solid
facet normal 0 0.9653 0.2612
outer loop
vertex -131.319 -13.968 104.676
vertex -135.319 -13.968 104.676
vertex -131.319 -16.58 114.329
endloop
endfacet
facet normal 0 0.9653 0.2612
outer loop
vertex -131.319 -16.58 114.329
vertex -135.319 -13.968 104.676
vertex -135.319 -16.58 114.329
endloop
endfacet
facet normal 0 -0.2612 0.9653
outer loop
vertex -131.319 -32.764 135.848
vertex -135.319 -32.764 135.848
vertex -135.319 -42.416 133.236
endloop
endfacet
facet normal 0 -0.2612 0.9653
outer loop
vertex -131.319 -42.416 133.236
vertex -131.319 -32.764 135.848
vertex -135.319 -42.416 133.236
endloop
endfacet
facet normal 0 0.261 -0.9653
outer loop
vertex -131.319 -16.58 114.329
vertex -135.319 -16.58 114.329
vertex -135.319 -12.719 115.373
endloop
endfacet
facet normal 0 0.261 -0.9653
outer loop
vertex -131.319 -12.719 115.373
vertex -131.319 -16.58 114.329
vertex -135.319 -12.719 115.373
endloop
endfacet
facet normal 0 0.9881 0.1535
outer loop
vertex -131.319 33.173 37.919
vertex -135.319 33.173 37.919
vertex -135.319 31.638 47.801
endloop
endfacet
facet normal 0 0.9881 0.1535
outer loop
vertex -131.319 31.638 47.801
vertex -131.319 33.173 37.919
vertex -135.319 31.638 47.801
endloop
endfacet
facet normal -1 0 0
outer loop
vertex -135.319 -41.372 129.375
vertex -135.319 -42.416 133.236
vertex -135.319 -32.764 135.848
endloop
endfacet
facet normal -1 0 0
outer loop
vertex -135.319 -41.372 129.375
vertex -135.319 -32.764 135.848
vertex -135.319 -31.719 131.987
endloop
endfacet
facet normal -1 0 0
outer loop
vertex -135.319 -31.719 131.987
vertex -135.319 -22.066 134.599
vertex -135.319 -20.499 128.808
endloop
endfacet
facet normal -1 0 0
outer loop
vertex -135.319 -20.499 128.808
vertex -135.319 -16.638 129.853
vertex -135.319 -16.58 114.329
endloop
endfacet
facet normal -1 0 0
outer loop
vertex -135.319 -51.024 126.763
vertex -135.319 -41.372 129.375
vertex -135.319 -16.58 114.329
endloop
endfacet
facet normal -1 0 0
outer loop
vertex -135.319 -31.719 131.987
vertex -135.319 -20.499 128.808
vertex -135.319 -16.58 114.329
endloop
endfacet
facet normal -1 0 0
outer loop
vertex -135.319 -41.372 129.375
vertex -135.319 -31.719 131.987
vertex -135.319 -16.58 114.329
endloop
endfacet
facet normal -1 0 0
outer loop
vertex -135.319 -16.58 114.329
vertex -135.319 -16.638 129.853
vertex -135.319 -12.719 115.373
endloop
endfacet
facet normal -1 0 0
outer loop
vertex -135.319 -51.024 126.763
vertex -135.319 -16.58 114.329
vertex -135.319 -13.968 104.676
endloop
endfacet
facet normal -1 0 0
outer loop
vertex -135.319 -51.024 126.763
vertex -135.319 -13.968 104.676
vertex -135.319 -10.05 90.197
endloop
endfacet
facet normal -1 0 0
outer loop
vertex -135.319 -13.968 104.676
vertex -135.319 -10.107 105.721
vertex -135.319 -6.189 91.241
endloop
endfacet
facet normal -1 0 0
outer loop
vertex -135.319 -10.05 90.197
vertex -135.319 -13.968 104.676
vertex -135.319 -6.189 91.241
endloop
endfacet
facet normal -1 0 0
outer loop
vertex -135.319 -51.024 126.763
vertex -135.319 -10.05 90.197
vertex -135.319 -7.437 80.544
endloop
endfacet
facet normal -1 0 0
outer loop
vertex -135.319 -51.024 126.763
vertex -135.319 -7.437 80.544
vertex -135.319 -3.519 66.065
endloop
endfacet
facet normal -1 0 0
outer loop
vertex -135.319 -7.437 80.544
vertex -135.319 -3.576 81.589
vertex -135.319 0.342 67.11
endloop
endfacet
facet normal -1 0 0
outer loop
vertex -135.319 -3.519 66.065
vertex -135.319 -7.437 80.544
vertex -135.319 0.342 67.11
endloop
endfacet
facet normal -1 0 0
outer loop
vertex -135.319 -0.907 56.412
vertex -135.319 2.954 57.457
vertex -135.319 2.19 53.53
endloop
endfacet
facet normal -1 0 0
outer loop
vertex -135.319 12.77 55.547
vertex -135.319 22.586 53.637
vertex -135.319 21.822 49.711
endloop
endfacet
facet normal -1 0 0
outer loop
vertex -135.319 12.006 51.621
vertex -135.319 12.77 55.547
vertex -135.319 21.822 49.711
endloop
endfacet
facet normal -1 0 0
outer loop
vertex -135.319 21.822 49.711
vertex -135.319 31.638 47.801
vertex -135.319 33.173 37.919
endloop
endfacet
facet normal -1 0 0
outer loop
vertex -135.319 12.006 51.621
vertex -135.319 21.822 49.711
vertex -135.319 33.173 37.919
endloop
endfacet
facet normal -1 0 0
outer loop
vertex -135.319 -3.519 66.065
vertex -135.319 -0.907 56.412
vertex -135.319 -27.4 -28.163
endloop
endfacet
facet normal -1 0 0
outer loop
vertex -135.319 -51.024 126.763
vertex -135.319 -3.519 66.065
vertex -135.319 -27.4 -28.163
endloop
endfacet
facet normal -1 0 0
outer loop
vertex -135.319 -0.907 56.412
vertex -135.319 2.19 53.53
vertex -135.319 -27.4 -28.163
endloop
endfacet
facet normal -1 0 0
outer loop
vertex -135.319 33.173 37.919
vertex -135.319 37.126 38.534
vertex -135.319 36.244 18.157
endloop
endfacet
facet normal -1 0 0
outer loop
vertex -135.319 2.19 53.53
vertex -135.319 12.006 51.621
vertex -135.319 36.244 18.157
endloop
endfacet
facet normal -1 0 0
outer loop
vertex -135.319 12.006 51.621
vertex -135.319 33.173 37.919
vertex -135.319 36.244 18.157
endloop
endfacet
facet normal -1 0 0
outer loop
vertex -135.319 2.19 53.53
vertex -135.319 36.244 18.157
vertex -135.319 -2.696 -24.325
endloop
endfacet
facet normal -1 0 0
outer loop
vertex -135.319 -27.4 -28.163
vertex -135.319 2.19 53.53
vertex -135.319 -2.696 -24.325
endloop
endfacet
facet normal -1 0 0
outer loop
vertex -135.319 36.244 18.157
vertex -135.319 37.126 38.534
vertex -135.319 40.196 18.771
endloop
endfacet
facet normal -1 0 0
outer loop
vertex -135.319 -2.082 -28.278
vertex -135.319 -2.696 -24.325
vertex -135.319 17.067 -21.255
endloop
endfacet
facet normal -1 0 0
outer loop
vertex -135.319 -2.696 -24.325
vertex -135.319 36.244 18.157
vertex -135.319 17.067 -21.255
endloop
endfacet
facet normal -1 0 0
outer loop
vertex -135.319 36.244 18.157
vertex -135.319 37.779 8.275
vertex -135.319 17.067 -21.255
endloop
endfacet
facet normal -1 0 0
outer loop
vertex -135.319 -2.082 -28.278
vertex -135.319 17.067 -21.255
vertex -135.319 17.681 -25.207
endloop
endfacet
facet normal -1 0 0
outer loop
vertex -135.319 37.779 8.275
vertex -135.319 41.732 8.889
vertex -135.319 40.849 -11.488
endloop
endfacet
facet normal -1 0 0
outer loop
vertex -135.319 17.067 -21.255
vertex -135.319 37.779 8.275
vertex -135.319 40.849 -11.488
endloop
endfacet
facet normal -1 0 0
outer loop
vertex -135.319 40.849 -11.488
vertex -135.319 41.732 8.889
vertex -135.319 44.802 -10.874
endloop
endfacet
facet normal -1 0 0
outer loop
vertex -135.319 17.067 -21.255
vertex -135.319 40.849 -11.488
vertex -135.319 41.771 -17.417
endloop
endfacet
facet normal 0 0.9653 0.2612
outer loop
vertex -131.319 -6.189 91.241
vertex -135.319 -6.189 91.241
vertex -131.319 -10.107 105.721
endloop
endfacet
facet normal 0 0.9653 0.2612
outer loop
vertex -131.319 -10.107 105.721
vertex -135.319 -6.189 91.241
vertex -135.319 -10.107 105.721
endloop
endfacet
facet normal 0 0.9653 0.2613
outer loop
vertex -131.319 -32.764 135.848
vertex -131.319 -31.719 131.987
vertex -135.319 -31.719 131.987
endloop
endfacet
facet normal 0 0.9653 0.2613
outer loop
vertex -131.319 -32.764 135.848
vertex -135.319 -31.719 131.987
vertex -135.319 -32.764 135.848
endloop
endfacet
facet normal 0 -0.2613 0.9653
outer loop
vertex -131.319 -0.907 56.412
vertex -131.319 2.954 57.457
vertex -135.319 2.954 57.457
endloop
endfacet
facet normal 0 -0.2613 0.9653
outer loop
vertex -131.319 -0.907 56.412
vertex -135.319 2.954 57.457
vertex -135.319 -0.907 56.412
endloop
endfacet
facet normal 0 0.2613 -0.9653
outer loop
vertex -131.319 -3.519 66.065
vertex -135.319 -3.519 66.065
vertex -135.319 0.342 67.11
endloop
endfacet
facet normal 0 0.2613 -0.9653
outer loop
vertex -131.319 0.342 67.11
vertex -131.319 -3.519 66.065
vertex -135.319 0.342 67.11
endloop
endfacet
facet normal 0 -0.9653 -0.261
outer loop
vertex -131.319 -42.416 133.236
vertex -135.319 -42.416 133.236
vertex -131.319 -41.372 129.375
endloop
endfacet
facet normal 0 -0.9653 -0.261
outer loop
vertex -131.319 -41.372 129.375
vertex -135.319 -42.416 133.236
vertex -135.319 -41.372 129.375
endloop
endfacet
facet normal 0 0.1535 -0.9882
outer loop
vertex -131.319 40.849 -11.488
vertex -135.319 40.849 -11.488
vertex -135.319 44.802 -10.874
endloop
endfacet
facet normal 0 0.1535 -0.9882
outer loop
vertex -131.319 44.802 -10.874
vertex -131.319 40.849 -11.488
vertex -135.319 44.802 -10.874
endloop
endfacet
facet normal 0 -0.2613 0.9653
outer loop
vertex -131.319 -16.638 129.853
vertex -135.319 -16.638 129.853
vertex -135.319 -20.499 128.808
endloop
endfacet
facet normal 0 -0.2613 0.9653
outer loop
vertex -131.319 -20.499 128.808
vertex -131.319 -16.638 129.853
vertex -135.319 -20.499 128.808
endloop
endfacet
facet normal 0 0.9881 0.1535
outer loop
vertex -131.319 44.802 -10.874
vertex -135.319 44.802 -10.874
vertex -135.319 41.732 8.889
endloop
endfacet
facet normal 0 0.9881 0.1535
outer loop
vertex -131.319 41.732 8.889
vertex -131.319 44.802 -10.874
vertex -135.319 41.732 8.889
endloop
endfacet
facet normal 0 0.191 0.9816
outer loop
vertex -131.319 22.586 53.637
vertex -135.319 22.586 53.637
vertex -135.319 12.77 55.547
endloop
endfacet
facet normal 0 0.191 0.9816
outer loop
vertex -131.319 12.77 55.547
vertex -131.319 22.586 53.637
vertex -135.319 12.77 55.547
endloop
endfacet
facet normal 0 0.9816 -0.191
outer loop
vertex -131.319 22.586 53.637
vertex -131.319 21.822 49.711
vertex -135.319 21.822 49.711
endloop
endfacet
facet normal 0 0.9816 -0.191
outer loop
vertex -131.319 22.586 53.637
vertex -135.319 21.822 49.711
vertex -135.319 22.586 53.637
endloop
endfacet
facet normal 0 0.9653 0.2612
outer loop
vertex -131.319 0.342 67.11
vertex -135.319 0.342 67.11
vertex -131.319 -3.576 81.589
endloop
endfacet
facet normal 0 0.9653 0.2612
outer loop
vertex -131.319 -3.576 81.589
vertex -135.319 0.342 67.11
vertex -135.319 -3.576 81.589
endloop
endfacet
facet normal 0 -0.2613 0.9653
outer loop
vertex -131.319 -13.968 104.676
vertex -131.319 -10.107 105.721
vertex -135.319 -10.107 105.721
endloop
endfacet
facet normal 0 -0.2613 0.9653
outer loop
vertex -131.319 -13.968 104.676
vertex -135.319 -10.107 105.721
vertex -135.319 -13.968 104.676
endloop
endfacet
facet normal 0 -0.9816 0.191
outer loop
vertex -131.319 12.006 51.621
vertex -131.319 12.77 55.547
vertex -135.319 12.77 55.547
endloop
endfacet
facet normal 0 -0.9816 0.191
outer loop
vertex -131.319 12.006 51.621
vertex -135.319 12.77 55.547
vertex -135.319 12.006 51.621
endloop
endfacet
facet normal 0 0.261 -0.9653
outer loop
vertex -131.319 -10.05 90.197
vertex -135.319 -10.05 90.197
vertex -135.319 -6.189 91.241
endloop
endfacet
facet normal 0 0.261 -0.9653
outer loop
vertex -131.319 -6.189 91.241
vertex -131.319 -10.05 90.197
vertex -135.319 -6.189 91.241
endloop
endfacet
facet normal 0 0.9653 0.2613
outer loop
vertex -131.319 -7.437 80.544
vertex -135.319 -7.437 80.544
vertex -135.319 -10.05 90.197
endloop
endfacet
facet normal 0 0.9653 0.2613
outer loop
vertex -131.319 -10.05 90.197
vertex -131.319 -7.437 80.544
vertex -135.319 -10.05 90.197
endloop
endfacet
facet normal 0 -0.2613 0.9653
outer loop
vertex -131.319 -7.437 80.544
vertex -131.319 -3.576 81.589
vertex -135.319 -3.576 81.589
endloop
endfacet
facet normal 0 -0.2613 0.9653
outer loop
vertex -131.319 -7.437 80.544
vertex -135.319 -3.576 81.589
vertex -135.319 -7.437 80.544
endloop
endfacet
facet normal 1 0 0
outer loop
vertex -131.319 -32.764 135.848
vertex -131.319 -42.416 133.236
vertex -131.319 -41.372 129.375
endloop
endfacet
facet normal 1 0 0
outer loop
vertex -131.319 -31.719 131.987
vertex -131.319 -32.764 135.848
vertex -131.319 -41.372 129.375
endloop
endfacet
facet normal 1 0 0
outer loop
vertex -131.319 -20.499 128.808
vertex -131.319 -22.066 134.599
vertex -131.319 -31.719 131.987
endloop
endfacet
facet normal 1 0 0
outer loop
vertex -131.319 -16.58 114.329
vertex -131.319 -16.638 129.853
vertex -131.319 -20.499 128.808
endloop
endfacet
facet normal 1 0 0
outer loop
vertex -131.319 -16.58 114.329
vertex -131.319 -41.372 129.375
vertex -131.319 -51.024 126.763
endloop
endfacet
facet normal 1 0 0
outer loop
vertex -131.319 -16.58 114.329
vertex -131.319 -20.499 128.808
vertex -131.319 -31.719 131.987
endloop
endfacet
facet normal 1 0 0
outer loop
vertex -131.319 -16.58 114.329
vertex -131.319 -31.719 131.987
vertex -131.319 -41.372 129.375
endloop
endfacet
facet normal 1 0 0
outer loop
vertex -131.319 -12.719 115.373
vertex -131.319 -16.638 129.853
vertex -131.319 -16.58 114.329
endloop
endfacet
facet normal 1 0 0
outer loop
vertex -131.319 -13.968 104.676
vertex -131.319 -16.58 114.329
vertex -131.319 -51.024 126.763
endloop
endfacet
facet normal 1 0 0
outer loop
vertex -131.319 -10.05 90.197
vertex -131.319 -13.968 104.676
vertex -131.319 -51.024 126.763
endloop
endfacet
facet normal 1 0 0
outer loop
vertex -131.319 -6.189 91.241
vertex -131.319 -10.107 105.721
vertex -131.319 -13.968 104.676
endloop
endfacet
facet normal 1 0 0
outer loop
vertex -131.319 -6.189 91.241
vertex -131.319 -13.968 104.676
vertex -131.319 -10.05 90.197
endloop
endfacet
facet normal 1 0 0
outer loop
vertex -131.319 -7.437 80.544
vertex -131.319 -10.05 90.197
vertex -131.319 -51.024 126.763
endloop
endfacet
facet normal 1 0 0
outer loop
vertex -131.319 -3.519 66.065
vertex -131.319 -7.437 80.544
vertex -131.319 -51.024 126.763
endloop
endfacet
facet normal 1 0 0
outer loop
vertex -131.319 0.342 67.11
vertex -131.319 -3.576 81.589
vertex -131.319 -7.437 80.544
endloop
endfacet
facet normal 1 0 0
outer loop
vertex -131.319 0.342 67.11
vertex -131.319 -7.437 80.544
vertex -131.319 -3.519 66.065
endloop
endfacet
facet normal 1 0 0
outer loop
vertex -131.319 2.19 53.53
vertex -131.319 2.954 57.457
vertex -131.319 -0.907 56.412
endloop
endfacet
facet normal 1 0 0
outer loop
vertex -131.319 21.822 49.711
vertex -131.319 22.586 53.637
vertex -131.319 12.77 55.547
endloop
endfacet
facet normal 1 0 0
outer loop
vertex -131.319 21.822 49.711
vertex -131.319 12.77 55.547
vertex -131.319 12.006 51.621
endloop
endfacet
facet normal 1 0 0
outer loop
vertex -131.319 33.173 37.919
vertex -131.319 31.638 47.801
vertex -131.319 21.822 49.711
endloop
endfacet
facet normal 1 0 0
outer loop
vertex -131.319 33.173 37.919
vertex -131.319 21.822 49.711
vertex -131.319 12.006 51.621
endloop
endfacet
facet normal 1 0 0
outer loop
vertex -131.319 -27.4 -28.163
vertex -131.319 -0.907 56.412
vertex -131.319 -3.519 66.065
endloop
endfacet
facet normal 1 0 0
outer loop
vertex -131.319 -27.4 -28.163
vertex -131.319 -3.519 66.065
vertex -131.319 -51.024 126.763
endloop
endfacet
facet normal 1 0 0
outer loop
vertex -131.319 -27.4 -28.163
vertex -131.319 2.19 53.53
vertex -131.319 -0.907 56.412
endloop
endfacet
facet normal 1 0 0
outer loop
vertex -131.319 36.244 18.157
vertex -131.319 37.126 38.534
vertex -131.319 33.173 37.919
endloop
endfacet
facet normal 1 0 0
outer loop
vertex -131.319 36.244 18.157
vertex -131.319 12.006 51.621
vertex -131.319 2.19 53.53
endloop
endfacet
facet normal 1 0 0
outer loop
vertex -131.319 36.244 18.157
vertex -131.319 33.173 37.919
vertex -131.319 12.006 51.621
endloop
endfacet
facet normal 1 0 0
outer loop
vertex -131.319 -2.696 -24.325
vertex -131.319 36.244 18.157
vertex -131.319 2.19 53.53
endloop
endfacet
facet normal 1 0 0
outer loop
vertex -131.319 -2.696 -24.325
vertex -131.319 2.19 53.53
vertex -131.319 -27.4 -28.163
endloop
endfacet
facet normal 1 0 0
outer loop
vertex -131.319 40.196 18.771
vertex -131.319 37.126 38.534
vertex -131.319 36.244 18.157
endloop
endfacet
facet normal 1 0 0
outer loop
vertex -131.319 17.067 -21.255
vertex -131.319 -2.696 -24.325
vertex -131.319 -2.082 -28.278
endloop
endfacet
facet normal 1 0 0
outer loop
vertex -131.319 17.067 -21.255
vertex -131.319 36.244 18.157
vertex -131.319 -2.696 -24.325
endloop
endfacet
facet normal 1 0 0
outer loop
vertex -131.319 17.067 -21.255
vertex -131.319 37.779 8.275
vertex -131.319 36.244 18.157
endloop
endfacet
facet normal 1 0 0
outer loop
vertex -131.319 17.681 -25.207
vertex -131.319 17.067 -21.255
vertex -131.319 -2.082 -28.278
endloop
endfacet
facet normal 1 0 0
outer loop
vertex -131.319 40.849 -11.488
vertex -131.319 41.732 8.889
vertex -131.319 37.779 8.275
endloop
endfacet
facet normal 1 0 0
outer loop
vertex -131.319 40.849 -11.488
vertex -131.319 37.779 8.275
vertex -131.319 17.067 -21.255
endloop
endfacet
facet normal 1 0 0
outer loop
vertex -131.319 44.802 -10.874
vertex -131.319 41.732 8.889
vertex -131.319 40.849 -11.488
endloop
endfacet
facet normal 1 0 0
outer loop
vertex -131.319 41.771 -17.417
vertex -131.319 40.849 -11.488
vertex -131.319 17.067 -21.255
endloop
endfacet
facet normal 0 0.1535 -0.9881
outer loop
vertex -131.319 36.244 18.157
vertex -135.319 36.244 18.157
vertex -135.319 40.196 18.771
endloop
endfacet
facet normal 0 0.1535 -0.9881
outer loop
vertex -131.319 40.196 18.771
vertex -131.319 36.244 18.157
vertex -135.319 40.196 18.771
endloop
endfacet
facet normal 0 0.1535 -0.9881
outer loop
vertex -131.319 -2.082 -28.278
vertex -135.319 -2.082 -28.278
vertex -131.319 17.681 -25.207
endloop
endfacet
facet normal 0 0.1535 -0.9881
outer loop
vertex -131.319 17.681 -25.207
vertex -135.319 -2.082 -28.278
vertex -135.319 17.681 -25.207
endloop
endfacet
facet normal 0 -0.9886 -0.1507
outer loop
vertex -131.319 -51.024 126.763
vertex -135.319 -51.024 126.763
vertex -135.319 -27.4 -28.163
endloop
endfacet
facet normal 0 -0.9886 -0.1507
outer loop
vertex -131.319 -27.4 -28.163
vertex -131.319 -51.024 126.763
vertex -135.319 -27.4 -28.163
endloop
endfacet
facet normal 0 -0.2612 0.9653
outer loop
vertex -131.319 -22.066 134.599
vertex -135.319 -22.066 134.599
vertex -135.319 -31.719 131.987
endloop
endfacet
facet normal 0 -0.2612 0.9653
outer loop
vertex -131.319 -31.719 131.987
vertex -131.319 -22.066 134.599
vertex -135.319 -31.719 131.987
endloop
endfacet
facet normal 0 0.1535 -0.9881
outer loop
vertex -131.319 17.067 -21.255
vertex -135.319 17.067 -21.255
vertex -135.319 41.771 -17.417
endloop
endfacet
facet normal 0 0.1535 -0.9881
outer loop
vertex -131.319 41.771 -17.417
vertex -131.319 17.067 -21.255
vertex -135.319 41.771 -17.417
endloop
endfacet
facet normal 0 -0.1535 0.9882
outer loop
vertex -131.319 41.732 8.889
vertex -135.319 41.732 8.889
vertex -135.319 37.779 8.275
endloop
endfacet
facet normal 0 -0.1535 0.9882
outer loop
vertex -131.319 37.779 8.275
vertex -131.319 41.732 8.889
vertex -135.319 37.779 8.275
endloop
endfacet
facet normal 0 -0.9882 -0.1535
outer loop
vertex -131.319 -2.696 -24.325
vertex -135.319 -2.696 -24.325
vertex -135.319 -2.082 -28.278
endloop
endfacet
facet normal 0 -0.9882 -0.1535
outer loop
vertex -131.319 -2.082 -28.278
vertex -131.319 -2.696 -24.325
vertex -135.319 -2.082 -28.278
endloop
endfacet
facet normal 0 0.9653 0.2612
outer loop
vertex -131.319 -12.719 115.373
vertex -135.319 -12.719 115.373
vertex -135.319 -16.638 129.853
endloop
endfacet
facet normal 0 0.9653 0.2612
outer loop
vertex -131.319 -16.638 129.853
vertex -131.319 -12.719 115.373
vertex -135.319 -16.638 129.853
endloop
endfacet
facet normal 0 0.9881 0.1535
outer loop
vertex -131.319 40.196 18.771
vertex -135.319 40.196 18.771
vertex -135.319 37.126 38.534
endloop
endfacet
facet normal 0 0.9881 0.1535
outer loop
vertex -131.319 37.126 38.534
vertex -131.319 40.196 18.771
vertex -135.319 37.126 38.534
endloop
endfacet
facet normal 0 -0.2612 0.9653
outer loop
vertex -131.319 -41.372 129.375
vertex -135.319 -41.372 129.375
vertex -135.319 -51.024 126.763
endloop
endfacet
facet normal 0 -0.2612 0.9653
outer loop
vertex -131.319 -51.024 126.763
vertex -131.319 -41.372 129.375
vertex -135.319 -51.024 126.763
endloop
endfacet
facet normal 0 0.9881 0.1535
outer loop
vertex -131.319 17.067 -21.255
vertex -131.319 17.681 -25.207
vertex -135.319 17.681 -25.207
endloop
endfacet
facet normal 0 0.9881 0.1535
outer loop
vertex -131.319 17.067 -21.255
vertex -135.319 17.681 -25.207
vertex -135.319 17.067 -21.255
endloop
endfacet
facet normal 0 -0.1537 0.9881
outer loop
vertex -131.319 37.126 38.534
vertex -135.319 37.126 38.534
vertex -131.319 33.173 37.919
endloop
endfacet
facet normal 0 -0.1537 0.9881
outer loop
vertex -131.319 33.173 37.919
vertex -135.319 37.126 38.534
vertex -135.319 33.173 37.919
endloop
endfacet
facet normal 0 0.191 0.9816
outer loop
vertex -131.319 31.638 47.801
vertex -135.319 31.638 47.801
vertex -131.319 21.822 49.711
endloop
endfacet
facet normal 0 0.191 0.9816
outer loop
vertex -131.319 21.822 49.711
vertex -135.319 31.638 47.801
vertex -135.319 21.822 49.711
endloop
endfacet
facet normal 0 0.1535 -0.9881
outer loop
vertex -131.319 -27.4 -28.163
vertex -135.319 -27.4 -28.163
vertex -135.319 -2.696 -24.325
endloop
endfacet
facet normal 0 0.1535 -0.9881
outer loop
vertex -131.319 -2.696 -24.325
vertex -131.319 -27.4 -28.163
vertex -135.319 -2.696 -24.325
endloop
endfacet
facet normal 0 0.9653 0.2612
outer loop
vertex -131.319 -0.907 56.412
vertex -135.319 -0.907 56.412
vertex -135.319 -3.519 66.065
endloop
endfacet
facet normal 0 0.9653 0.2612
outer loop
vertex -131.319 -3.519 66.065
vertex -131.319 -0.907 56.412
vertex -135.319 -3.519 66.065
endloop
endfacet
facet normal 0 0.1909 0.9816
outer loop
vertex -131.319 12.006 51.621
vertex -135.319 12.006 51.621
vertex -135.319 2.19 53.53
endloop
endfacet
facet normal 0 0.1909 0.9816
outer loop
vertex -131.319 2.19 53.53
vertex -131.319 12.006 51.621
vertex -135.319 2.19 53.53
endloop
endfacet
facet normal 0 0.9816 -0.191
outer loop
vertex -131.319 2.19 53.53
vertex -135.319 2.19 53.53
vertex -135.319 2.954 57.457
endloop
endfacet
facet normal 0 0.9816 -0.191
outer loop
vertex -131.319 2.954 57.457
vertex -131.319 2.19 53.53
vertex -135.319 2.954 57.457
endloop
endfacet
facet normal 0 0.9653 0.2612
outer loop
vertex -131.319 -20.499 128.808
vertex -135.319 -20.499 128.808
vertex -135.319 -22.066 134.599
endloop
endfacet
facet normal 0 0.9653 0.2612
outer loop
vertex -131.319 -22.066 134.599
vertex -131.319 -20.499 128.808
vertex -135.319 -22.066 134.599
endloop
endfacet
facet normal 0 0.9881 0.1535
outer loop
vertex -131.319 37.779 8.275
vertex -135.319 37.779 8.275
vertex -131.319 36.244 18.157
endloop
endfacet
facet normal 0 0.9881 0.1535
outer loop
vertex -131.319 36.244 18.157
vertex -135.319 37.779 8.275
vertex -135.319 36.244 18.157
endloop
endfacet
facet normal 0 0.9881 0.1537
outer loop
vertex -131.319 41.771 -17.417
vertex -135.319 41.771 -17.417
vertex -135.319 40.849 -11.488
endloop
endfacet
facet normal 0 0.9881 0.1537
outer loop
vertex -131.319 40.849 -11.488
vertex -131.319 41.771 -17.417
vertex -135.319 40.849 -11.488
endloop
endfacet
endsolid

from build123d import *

# Parameters (mm, degrees)
BOSS_EXTRUDE2_DEPTH = 4


with BuildPart() as part:
    # 3DSketch1 → Boss-Extrude2 (new body)
    with BuildSketch(Plane(origin=(-135.319434073, -27.39955072, -28.163146814), x_dir=(-1.1839737659606398e-15, -0.03268810373539661, 0.9994656011460245), z_dir=(-1, 0, 0))):
        Polygon((0, 0), (3.028470594, 24.815889383), (-0.942071707, 25.300444678), (1.480704768, 45.153156184), (5.451247069, 44.668600889), (8.479717663, 69.484490272), (14.435531115, 68.757657329), (14.92008641, 72.728199631), (34.772797916, 70.305423155), (34.288242621, 66.334880854), (44.214598374, 65.123492617), (44.699153669, 69.094034918), (64.551865176, 66.671258443), (64.067309881, 62.700716141), (73.993665634, 61.489327904), (76.223321536, 51.741064748), (80.122626798, 52.632927109), (82.3522827, 42.884663953), (78.452977438, 41.992801592), (80.68263334, 32.244538436), (84.581938602, 33.136400797), (83.663812307, 29.243195934), (93.396824464, 26.947880195), (94.31495076, 30.841085058), (108.914468996, 27.398111451), (107.996342701, 23.504906588), (117.729354858, 21.209590849), (118.647481154, 25.102795712), (133.24699939, 21.659822105), (132.328873095, 17.766617242), (142.061885253, 15.471301504), (142.980011548, 19.364506367), (157.579529784, 15.921532759), (156.661403489, 12.028327896), (162.501210784, 10.651138453), (160.205895045, 0.918126295), (164.099099908, 0), (161.80378417, -9.733012158), (157.910579307, -8.814885862), (155.615263569, -18.54789802), align=None)
    extrude(amount=-BOSS_EXTRUDE2_DEPTH)


solid = part.part
